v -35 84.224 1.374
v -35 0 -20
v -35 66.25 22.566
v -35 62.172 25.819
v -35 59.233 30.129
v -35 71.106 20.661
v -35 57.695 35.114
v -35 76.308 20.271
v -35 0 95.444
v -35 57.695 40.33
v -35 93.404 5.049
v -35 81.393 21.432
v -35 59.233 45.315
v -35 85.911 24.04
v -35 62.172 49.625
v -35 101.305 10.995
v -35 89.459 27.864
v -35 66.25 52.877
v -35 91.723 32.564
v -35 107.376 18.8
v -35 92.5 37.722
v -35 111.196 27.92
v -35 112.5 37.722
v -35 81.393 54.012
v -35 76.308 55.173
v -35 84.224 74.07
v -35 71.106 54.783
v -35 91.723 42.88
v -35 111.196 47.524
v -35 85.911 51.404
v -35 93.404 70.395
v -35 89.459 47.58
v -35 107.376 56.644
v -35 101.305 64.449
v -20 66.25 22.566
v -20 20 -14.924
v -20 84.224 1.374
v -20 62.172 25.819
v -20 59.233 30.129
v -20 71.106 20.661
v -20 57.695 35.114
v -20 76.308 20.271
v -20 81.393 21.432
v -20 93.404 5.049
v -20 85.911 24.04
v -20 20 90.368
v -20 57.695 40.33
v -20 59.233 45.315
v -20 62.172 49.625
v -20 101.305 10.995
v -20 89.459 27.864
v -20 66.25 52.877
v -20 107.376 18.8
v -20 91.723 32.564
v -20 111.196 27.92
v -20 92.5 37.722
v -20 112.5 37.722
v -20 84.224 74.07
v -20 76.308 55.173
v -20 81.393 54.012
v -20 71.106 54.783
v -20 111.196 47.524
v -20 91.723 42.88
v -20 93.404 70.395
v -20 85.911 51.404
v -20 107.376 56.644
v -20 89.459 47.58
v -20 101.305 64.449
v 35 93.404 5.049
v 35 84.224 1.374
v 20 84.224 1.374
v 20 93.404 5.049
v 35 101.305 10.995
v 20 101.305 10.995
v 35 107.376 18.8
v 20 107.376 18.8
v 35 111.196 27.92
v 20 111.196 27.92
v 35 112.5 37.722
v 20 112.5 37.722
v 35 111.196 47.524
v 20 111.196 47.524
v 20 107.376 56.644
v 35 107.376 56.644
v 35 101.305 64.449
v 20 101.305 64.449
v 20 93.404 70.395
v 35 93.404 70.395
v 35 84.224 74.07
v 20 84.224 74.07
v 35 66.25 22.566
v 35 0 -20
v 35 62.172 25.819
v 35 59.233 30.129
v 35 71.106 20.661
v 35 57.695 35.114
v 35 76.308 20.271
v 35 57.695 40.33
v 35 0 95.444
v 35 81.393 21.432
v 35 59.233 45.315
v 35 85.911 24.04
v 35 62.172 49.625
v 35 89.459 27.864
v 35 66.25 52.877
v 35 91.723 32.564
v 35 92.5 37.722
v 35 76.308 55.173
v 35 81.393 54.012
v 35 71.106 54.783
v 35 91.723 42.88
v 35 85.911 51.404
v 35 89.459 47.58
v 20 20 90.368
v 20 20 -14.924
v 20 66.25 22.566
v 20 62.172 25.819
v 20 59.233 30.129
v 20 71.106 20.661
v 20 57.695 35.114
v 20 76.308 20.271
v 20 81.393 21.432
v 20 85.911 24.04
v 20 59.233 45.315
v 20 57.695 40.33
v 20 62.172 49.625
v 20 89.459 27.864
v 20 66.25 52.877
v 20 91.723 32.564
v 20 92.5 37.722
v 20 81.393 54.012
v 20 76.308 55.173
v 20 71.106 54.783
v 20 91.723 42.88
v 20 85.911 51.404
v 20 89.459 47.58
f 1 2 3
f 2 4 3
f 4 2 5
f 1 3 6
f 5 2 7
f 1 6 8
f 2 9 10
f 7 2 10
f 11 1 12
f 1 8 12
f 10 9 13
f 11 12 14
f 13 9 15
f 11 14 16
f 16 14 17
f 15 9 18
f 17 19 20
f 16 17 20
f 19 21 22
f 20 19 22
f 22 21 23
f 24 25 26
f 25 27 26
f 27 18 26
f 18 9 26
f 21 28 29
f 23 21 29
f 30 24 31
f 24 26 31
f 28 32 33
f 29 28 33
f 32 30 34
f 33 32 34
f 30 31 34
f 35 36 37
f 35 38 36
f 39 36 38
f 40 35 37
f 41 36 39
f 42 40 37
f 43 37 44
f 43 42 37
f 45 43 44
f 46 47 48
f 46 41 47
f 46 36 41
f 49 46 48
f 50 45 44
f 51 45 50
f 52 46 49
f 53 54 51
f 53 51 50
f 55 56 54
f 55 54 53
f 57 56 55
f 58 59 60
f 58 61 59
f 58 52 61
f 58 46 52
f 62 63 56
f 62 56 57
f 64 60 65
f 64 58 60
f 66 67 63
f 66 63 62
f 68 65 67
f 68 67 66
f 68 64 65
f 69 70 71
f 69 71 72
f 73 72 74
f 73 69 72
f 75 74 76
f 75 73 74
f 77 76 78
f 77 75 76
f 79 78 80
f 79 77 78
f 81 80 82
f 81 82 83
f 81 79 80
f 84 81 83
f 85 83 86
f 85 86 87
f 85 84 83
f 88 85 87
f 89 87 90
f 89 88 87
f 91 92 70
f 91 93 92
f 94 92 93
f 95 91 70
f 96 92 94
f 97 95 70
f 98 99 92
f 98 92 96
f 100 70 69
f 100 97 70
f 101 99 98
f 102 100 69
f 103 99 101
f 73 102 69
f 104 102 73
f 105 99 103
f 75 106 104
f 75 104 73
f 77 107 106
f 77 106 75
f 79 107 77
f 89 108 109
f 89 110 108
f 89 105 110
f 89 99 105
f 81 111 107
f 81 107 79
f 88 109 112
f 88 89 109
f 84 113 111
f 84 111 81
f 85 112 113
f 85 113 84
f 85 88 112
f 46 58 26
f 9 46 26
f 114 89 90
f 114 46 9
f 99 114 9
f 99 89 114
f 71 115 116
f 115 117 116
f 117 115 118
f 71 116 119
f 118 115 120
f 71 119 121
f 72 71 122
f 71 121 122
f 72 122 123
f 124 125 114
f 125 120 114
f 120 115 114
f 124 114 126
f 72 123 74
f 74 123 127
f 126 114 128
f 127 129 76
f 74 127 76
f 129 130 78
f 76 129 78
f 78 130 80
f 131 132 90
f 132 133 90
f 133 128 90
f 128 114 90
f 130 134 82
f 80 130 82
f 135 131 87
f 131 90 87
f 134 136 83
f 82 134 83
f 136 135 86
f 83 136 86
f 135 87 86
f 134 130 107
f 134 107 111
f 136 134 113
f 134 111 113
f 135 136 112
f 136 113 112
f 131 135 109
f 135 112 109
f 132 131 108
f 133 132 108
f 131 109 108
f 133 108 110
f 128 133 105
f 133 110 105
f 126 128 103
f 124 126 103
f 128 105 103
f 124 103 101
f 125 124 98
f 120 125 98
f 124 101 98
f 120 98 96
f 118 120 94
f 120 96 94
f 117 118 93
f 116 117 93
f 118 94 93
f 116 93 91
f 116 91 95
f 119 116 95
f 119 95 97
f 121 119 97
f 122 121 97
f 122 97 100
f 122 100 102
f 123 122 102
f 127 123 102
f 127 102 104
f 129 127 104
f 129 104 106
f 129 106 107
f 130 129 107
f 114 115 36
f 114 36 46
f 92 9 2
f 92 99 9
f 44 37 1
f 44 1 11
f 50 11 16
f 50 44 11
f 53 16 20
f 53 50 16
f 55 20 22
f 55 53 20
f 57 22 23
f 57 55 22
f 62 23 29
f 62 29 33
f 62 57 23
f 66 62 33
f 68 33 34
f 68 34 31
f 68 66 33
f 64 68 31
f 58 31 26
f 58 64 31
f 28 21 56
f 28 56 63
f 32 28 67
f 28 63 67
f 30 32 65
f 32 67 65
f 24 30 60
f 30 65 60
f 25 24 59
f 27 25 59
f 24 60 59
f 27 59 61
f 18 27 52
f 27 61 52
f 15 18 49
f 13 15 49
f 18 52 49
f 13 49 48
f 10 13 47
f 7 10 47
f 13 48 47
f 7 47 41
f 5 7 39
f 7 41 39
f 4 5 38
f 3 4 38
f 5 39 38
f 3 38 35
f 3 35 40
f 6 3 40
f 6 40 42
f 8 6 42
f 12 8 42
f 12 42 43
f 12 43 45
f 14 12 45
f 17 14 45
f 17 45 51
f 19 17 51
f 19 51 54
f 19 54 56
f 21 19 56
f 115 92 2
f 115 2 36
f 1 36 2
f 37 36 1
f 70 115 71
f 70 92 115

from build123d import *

# Parameters (mm, degrees)
F1_DEPTH = 35
F2_W     = 163.409721
F2_H     = 173.085335
F3_DEPTH = 20
F4_R     = 17.5
F5_DEPTH = 100


with BuildPart() as f1:
    # F0 (on Right) → F1 (new body, symmetric)
    with BuildSketch(Plane.YZ):
        with BuildLine():
            Line((0, 37.721872), (0, 0))
            Line((0, 0), (0, -20))
            Line((0, -20), (84.224192, 1.374048))
            ThreePointArc((84.224192, 1.374048), (112.5, 37.721872), (84.224192, 74.069695))
            Line((84.224192, 74.069695), (0, 95.443744))
            Line((0, 95.443744), (0, 75.443744))
            Line((0, 75.443744), (0, 37.721872))
        make_face()
    extrude(amount=F1_DEPTH, both=True)

    # F2 (on Right) → F3 (cut, symmetric)
    with BuildSketch(Plane.YZ):
        with Locations((101.70486, 41.636539)):
            Rectangle(F2_W, F2_H)
    extrude(amount=F3_DEPTH, both=True, mode=Mode.SUBTRACT)

    # F4 (on face) → F5 (cut)
    with BuildSketch(Plane.YZ.offset(35)):
        with Locations((75, 37.721872)):
            Circle(F4_R)
    extrude(amount=-F5_DEPTH, mode=Mode.SUBTRACT)


solid = f1.part
